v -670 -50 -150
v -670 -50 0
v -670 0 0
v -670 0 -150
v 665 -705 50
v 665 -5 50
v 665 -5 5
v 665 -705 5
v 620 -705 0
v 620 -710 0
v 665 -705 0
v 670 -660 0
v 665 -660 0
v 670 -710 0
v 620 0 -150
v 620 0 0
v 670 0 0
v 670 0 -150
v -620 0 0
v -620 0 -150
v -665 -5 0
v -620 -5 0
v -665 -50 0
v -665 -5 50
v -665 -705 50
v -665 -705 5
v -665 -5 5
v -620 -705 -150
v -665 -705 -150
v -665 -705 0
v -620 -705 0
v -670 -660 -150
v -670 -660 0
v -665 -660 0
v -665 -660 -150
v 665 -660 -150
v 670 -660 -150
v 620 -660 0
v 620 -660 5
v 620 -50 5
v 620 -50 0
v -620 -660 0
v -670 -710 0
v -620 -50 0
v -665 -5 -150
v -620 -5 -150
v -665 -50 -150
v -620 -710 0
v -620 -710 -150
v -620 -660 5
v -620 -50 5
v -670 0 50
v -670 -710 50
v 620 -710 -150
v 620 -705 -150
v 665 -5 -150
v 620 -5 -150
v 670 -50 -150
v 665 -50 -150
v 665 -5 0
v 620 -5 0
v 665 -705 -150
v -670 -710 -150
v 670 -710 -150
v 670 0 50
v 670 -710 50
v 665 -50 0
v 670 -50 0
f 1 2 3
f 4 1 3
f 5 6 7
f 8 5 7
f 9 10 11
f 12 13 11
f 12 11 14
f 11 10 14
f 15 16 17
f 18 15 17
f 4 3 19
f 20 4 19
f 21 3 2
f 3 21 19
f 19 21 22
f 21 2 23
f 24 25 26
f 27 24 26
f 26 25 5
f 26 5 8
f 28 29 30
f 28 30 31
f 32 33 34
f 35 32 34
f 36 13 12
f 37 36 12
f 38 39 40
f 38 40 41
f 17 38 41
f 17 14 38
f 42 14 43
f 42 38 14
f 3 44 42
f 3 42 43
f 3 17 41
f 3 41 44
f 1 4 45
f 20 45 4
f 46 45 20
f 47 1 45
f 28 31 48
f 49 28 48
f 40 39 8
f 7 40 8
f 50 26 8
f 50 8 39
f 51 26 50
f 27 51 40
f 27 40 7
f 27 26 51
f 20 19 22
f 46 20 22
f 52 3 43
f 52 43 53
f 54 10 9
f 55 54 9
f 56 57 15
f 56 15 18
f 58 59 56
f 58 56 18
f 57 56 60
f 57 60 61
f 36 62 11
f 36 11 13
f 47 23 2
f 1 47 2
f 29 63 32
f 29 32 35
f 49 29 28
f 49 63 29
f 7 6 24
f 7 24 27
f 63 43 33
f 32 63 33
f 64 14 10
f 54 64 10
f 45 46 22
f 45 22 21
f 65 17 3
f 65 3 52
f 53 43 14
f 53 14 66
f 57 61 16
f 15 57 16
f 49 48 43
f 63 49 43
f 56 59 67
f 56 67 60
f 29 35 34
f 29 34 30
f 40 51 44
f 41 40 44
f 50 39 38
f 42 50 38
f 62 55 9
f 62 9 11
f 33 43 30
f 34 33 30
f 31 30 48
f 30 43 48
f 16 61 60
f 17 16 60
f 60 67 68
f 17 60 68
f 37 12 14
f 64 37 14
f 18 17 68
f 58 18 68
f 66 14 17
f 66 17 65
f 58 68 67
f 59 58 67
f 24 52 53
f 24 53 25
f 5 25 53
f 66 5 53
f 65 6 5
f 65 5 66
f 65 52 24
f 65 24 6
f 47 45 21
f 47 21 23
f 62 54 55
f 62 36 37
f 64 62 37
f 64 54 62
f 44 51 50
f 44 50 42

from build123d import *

# Parameters (mm, degrees)
F1_DEPTH = 670
F3_DEPTH = 710
F5_DEPTH = 1340
F7_DEPTH = 710
F9_DEPTH = 150


with BuildPart() as f1:
    # F0 (on Right) → F1 (new body, symmetric)
    with BuildSketch(Plane.YZ):
        Polygon((-5, 0), (0, 0), (0, 5), (0, 50), (-5, 50), (-5, 5), (-50, 5), (-50, 0), align=None)
    extrude(amount=F1_DEPTH, both=True)

    # F2 (on face) → F3 (join)
    with BuildSketch(Plane.XZ.offset(710)):
        Polygon((620, 0), (670, 0), (670, 50), (665, 50), (665, 5), (620, 5), align=None)
    extrude(amount=-F3_DEPTH)

    # F4 (on face) → F5 (join)
    with BuildSketch(Plane(origin=(-670, 0, 0), x_dir=(0, -1, 0), z_dir=(-1, 0, 0))):
        Polygon((710, 0), (710, 50), (705, 50), (705, 5), (660, 5), (660, 0), align=None)
    extrude(amount=-F5_DEPTH)

    # F6 (on face) → F7 (join)
    with BuildSketch(Plane(origin=(0, 0, 0), x_dir=(-1, 0, 0), z_dir=(0, 1, 0))):
        Polygon((670, 0), (670, 50), (665, 50), (665, 5), (620, 5), (620, 0), align=None)
    extrude(amount=-F7_DEPTH)


with BuildPart() as f9:
    # F8 (on face) → F9 (new body)
    with BuildSketch(Plane(origin=(0, 0, 0), x_dir=(1, 0, 0), z_dir=(0, 0, -1))):
        Polygon((-670, 50), (-670, 0), (-620, 0), (-620, 5), (-665, 5), (-665, 50), align=None)
        Polygon((-620, 710), (-670, 710), (-670, 660), (-665, 660), (-665, 705), (-620, 705), align=None)
        Polygon((620, 5), (620, 0), (670, 0), (670, 50), (665, 50), (665, 5), align=None)
        Polygon((620, 710), (620, 705), (665, 705), (665, 660), (670, 660), (670, 710), align=None)
    extrude(amount=F9_DEPTH)


solid = Compound([f1.part, f9.part])
